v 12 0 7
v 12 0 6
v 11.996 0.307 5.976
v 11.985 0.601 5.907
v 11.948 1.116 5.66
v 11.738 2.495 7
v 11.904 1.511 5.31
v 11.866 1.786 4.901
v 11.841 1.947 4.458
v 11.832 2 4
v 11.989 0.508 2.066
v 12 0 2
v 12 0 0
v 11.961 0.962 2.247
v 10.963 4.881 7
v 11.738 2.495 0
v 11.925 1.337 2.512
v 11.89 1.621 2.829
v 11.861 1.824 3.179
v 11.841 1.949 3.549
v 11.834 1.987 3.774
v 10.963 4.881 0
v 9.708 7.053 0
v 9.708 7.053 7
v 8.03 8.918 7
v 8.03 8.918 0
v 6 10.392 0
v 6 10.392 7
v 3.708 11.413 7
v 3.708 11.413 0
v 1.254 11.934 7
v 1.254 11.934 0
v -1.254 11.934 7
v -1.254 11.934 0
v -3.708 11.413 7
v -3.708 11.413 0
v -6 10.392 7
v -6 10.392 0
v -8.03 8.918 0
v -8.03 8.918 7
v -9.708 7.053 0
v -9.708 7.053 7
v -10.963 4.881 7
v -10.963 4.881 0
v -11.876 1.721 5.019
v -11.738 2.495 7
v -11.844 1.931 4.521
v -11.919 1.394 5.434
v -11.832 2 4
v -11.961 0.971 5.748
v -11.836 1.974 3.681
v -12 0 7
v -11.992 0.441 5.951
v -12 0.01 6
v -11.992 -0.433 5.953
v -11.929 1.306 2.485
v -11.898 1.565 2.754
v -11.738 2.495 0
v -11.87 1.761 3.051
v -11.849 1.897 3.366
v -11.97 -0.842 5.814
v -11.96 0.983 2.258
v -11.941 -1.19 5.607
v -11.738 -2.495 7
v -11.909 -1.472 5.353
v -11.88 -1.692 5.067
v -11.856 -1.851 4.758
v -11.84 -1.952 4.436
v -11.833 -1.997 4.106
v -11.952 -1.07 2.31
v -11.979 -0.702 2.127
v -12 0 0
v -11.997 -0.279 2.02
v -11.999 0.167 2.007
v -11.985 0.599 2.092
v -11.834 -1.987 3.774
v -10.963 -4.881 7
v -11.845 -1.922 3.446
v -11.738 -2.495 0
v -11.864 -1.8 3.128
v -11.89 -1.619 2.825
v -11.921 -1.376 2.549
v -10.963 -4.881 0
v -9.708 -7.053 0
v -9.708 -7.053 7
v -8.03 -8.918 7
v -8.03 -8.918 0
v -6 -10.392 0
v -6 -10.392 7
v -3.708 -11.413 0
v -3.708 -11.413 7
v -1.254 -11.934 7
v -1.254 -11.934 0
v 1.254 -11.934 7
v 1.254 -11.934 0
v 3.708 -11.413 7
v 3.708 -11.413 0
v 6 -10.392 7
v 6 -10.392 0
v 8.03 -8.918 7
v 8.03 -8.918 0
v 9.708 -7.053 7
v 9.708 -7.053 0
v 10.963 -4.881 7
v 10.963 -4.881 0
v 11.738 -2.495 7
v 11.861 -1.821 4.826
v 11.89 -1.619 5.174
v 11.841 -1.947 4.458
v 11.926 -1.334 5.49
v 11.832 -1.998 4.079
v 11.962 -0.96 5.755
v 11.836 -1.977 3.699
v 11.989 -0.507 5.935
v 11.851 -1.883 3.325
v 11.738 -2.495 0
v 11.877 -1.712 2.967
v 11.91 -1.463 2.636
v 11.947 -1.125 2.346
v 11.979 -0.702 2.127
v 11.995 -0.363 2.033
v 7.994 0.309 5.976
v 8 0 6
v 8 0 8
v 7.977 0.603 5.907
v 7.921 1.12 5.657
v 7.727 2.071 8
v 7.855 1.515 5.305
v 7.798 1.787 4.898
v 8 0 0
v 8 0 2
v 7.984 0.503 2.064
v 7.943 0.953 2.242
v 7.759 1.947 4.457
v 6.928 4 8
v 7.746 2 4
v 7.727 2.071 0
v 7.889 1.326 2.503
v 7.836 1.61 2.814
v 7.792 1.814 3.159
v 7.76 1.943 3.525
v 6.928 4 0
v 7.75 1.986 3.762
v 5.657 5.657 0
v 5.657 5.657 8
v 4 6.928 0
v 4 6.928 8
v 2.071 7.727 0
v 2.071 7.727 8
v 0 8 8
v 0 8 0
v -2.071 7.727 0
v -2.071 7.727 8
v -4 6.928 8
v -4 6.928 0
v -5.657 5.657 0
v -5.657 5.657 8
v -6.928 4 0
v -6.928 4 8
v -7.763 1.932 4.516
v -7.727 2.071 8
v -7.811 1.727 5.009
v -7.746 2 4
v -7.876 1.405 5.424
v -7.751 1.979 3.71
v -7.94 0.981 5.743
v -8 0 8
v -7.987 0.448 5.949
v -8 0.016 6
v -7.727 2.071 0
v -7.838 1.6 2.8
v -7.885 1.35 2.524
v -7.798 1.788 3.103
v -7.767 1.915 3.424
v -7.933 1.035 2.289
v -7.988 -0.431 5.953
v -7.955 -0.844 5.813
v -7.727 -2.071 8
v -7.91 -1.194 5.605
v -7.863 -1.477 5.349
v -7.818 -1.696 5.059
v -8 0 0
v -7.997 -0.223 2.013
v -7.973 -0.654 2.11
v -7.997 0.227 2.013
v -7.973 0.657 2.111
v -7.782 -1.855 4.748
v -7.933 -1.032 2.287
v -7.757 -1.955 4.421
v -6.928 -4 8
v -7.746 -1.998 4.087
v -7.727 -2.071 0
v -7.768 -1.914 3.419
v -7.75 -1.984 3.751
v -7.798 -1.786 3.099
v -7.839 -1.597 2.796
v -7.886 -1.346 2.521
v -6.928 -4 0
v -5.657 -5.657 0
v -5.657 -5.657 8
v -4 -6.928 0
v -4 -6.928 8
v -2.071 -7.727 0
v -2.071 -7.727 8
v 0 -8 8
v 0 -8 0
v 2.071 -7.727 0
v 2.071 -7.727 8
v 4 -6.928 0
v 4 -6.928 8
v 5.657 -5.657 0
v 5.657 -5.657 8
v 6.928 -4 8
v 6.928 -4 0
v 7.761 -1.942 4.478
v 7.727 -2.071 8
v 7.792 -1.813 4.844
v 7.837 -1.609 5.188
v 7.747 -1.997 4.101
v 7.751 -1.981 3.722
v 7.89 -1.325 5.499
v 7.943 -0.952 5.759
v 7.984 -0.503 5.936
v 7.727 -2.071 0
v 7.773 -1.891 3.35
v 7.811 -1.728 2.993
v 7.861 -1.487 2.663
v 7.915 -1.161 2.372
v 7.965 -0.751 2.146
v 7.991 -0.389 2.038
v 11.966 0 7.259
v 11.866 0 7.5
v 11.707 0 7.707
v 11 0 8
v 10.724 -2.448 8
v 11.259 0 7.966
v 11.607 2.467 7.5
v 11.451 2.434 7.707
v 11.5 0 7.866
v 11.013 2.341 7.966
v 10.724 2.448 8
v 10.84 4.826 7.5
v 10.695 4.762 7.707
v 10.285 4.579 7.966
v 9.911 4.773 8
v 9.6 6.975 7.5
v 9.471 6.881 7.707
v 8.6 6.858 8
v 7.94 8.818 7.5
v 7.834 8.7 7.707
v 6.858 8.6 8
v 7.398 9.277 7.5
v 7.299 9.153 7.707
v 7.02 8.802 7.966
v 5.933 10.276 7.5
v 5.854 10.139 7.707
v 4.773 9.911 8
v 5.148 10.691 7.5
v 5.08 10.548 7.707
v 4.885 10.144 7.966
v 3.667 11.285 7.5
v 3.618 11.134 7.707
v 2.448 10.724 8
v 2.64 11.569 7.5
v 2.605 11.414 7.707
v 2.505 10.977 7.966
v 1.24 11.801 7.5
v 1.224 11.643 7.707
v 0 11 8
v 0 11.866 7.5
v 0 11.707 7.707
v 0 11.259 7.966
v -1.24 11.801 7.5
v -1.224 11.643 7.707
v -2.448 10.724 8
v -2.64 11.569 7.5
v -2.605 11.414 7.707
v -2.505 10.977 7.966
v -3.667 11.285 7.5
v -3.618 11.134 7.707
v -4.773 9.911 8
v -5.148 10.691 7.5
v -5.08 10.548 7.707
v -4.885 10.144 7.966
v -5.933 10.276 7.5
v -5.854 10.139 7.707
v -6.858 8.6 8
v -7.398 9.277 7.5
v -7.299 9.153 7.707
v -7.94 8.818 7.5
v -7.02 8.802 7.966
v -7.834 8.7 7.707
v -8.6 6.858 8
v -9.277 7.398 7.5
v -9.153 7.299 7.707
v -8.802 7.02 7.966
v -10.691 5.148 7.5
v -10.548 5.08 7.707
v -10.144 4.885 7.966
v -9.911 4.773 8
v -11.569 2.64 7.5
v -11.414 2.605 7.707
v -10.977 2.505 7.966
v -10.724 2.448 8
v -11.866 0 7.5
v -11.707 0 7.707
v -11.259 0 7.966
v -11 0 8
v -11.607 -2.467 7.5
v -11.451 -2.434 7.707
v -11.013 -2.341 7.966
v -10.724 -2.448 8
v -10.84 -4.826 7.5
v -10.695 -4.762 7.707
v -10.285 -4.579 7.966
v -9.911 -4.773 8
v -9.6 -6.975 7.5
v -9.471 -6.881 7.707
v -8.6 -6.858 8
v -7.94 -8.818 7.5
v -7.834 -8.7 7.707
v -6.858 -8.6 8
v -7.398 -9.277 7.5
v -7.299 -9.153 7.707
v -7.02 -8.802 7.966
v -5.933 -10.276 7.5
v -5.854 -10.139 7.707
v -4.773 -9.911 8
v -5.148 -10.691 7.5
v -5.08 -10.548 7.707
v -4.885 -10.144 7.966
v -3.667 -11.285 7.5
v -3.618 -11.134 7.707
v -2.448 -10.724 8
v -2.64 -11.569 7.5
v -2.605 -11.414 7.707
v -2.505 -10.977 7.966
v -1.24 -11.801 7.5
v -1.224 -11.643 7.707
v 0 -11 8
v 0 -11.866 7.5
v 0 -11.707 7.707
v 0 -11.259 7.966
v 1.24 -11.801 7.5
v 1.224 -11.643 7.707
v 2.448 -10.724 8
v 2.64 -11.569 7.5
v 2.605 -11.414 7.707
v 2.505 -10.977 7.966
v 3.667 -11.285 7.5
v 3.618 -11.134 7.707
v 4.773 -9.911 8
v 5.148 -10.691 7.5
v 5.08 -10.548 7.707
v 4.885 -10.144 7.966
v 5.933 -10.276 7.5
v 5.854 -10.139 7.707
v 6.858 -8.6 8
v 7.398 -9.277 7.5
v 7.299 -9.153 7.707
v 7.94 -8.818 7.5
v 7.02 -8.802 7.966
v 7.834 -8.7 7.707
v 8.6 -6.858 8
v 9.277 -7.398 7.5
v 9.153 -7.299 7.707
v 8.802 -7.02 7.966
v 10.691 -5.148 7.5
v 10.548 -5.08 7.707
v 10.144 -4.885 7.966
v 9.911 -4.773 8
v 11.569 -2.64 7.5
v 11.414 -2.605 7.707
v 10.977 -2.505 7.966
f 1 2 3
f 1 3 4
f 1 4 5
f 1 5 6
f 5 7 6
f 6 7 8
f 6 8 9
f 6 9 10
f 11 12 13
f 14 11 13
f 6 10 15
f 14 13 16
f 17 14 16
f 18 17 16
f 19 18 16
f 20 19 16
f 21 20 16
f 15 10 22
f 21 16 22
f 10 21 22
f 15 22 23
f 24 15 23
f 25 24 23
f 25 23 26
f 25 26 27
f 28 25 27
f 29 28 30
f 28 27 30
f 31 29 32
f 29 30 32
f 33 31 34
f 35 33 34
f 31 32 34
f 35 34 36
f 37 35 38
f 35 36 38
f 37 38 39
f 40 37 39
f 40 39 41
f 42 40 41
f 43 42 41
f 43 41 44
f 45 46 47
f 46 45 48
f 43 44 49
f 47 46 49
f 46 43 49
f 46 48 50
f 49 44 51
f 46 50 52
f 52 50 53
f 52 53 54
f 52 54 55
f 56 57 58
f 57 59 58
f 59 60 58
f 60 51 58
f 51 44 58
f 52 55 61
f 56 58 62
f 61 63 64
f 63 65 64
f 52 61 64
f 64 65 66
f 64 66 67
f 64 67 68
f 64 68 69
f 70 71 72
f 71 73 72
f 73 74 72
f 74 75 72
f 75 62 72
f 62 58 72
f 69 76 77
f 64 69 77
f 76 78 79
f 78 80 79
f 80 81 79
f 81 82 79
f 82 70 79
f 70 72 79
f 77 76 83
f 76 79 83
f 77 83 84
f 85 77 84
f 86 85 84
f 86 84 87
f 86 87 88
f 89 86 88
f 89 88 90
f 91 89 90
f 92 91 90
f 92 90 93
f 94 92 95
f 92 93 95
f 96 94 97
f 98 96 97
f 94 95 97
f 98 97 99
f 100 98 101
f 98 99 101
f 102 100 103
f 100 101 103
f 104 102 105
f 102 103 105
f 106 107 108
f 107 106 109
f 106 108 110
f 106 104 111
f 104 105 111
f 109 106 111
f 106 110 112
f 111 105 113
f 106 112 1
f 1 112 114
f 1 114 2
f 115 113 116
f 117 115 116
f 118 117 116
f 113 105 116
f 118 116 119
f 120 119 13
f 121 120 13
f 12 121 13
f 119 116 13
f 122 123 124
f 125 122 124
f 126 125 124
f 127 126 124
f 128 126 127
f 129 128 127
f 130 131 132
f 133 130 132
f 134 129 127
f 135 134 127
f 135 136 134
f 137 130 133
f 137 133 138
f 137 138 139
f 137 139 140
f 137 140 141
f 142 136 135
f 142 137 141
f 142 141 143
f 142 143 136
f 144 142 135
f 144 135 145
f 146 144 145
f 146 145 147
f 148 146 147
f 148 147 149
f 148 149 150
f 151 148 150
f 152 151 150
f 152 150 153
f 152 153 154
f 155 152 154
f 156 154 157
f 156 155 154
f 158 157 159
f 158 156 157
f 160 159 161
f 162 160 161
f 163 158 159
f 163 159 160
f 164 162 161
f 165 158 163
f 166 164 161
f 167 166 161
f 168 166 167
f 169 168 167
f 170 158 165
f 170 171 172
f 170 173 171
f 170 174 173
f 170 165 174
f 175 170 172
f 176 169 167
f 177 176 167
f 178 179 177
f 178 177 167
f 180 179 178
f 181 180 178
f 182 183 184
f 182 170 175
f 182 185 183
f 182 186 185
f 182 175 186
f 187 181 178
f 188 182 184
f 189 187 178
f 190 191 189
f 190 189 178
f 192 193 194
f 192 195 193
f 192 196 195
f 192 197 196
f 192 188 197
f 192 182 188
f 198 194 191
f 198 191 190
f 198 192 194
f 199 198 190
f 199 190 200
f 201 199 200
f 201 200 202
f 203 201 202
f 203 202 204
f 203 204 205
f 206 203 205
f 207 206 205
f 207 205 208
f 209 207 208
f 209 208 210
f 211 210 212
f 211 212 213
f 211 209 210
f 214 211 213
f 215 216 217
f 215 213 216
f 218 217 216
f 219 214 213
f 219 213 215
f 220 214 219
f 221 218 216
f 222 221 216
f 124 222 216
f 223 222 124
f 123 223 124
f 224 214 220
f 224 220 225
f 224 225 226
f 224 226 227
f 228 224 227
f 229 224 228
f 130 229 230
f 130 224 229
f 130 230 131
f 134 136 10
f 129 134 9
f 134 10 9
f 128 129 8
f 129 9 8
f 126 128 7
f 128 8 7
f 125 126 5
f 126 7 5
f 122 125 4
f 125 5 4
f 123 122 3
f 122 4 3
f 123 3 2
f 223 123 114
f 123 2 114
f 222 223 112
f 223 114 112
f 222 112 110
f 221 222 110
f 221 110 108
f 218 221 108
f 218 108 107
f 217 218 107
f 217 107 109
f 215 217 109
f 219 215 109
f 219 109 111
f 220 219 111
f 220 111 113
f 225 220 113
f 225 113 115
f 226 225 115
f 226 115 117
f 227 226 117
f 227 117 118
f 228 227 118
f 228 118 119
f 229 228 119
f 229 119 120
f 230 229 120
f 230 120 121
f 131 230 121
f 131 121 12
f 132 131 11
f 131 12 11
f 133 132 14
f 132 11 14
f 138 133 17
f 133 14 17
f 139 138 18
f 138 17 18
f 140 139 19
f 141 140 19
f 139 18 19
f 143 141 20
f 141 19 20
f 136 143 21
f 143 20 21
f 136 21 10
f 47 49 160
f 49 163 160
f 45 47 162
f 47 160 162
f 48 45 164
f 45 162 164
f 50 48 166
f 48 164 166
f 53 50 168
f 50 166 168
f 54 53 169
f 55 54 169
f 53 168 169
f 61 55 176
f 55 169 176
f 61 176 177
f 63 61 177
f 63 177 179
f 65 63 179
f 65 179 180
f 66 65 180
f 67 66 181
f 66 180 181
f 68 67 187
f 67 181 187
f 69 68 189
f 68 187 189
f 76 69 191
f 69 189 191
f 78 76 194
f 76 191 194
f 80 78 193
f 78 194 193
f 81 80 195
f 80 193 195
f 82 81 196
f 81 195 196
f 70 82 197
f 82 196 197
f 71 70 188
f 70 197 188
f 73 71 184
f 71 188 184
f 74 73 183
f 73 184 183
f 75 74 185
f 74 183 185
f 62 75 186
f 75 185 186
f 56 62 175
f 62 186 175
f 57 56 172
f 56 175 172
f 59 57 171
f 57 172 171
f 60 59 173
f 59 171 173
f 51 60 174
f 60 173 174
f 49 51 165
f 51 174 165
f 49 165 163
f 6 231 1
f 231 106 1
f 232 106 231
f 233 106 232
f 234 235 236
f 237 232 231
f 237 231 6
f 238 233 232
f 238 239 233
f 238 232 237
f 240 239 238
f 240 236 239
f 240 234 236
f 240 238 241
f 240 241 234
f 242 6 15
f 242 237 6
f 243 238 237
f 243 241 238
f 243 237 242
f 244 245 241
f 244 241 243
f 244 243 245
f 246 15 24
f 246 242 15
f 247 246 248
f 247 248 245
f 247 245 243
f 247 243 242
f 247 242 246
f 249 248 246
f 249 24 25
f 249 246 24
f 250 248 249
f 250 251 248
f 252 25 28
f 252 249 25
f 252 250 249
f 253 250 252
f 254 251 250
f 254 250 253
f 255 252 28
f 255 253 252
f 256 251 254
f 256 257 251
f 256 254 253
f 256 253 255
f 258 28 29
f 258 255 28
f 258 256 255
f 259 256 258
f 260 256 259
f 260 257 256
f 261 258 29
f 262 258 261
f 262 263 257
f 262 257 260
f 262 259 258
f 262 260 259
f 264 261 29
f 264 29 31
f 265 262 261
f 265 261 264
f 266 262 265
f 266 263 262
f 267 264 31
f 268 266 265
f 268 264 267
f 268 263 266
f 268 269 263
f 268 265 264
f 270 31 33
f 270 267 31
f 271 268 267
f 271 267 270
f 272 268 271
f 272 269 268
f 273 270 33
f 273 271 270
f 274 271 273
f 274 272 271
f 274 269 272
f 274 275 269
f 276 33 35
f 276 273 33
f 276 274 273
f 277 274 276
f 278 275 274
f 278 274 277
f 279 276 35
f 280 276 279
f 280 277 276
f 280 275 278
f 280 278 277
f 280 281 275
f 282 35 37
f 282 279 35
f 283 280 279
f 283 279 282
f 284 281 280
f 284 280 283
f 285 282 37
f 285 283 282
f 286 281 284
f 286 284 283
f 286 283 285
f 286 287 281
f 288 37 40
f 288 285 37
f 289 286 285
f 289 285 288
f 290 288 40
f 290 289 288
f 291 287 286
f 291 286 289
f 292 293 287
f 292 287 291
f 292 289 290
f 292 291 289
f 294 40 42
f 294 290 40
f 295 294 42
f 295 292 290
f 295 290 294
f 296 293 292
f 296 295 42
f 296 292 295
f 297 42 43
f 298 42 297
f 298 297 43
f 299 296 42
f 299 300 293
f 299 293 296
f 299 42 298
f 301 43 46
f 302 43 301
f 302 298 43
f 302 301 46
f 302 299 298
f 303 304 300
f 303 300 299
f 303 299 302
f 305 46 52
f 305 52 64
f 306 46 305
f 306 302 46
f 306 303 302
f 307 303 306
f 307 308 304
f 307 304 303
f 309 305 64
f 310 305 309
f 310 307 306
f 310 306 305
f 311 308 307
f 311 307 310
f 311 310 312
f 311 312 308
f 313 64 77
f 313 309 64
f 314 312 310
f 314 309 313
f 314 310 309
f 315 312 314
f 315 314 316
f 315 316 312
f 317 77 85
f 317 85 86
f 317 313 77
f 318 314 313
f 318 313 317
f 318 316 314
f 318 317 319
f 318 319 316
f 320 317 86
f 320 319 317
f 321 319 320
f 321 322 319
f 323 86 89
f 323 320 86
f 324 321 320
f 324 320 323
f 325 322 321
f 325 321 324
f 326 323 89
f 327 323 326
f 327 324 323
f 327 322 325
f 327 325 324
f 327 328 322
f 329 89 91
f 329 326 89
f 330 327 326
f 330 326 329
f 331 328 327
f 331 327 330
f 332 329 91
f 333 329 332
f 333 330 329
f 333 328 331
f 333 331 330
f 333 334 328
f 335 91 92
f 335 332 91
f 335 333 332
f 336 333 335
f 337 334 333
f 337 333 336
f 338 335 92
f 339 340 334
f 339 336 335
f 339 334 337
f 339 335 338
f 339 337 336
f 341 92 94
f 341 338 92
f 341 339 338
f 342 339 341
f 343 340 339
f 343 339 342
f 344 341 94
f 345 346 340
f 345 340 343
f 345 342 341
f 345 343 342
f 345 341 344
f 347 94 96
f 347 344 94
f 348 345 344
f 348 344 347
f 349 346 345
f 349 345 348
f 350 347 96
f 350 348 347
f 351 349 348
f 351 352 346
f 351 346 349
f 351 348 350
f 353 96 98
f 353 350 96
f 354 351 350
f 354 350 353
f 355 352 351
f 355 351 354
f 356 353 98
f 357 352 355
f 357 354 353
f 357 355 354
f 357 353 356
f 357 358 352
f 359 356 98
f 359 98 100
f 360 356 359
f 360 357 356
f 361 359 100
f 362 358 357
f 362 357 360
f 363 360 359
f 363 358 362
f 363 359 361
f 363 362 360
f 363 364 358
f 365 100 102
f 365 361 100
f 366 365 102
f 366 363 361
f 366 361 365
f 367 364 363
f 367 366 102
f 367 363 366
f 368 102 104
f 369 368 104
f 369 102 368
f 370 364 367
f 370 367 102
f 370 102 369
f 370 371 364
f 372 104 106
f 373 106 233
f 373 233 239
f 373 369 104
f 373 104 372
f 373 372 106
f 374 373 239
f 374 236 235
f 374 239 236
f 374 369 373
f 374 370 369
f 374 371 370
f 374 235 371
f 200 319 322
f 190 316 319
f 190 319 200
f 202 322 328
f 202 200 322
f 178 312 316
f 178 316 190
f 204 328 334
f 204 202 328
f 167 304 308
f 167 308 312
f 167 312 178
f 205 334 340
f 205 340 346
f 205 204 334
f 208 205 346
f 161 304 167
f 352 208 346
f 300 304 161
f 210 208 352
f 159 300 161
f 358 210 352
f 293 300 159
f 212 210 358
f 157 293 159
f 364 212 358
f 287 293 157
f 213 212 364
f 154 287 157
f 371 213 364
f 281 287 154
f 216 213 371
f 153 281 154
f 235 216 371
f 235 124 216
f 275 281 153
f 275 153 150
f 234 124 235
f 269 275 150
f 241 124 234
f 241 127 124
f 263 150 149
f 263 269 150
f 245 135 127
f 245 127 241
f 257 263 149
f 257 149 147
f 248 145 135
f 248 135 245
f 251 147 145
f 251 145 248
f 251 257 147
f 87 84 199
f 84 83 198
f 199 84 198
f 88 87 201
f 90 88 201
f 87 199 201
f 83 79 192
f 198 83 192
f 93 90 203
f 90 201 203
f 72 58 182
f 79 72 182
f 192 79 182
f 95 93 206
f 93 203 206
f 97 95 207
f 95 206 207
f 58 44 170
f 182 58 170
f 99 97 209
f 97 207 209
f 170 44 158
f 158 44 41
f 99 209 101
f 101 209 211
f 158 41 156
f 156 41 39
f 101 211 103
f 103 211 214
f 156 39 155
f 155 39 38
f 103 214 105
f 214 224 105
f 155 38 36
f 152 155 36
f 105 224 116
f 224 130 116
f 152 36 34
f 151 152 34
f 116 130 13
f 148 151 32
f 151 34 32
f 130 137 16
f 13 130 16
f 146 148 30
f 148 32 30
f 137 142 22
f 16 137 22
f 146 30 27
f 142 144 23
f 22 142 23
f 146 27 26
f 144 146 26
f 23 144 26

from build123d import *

# Parameters (mm, degrees)
F0_R     = 12
F0_R_2   = 8
F1_DEPTH = 8
F2_R     = 1
F3_R     = 2
F4_DEPTH = 30


with BuildPart() as f1:
    # F0 (on Top) → F1 (new body)
    with BuildSketch(Plane.XY):
        Circle(F0_R)
        Circle(F0_R_2, mode=Mode.SUBTRACT)
    extrude(amount=F1_DEPTH)

    # F2
    f2_edges = [f1.edges().sort_by_distance(p)[0] for p in [
        (-12, 0, 8),
    ]]
    fillet(f2_edges, radius=F2_R)

    # F3 (on Right) → F4 (cut, symmetric)
    with BuildSketch(Plane.YZ):
        with Locations((0, 4)):
            Circle(F3_R)
    extrude(amount=F4_DEPTH, both=True, mode=Mode.SUBTRACT)


solid = f1.part
